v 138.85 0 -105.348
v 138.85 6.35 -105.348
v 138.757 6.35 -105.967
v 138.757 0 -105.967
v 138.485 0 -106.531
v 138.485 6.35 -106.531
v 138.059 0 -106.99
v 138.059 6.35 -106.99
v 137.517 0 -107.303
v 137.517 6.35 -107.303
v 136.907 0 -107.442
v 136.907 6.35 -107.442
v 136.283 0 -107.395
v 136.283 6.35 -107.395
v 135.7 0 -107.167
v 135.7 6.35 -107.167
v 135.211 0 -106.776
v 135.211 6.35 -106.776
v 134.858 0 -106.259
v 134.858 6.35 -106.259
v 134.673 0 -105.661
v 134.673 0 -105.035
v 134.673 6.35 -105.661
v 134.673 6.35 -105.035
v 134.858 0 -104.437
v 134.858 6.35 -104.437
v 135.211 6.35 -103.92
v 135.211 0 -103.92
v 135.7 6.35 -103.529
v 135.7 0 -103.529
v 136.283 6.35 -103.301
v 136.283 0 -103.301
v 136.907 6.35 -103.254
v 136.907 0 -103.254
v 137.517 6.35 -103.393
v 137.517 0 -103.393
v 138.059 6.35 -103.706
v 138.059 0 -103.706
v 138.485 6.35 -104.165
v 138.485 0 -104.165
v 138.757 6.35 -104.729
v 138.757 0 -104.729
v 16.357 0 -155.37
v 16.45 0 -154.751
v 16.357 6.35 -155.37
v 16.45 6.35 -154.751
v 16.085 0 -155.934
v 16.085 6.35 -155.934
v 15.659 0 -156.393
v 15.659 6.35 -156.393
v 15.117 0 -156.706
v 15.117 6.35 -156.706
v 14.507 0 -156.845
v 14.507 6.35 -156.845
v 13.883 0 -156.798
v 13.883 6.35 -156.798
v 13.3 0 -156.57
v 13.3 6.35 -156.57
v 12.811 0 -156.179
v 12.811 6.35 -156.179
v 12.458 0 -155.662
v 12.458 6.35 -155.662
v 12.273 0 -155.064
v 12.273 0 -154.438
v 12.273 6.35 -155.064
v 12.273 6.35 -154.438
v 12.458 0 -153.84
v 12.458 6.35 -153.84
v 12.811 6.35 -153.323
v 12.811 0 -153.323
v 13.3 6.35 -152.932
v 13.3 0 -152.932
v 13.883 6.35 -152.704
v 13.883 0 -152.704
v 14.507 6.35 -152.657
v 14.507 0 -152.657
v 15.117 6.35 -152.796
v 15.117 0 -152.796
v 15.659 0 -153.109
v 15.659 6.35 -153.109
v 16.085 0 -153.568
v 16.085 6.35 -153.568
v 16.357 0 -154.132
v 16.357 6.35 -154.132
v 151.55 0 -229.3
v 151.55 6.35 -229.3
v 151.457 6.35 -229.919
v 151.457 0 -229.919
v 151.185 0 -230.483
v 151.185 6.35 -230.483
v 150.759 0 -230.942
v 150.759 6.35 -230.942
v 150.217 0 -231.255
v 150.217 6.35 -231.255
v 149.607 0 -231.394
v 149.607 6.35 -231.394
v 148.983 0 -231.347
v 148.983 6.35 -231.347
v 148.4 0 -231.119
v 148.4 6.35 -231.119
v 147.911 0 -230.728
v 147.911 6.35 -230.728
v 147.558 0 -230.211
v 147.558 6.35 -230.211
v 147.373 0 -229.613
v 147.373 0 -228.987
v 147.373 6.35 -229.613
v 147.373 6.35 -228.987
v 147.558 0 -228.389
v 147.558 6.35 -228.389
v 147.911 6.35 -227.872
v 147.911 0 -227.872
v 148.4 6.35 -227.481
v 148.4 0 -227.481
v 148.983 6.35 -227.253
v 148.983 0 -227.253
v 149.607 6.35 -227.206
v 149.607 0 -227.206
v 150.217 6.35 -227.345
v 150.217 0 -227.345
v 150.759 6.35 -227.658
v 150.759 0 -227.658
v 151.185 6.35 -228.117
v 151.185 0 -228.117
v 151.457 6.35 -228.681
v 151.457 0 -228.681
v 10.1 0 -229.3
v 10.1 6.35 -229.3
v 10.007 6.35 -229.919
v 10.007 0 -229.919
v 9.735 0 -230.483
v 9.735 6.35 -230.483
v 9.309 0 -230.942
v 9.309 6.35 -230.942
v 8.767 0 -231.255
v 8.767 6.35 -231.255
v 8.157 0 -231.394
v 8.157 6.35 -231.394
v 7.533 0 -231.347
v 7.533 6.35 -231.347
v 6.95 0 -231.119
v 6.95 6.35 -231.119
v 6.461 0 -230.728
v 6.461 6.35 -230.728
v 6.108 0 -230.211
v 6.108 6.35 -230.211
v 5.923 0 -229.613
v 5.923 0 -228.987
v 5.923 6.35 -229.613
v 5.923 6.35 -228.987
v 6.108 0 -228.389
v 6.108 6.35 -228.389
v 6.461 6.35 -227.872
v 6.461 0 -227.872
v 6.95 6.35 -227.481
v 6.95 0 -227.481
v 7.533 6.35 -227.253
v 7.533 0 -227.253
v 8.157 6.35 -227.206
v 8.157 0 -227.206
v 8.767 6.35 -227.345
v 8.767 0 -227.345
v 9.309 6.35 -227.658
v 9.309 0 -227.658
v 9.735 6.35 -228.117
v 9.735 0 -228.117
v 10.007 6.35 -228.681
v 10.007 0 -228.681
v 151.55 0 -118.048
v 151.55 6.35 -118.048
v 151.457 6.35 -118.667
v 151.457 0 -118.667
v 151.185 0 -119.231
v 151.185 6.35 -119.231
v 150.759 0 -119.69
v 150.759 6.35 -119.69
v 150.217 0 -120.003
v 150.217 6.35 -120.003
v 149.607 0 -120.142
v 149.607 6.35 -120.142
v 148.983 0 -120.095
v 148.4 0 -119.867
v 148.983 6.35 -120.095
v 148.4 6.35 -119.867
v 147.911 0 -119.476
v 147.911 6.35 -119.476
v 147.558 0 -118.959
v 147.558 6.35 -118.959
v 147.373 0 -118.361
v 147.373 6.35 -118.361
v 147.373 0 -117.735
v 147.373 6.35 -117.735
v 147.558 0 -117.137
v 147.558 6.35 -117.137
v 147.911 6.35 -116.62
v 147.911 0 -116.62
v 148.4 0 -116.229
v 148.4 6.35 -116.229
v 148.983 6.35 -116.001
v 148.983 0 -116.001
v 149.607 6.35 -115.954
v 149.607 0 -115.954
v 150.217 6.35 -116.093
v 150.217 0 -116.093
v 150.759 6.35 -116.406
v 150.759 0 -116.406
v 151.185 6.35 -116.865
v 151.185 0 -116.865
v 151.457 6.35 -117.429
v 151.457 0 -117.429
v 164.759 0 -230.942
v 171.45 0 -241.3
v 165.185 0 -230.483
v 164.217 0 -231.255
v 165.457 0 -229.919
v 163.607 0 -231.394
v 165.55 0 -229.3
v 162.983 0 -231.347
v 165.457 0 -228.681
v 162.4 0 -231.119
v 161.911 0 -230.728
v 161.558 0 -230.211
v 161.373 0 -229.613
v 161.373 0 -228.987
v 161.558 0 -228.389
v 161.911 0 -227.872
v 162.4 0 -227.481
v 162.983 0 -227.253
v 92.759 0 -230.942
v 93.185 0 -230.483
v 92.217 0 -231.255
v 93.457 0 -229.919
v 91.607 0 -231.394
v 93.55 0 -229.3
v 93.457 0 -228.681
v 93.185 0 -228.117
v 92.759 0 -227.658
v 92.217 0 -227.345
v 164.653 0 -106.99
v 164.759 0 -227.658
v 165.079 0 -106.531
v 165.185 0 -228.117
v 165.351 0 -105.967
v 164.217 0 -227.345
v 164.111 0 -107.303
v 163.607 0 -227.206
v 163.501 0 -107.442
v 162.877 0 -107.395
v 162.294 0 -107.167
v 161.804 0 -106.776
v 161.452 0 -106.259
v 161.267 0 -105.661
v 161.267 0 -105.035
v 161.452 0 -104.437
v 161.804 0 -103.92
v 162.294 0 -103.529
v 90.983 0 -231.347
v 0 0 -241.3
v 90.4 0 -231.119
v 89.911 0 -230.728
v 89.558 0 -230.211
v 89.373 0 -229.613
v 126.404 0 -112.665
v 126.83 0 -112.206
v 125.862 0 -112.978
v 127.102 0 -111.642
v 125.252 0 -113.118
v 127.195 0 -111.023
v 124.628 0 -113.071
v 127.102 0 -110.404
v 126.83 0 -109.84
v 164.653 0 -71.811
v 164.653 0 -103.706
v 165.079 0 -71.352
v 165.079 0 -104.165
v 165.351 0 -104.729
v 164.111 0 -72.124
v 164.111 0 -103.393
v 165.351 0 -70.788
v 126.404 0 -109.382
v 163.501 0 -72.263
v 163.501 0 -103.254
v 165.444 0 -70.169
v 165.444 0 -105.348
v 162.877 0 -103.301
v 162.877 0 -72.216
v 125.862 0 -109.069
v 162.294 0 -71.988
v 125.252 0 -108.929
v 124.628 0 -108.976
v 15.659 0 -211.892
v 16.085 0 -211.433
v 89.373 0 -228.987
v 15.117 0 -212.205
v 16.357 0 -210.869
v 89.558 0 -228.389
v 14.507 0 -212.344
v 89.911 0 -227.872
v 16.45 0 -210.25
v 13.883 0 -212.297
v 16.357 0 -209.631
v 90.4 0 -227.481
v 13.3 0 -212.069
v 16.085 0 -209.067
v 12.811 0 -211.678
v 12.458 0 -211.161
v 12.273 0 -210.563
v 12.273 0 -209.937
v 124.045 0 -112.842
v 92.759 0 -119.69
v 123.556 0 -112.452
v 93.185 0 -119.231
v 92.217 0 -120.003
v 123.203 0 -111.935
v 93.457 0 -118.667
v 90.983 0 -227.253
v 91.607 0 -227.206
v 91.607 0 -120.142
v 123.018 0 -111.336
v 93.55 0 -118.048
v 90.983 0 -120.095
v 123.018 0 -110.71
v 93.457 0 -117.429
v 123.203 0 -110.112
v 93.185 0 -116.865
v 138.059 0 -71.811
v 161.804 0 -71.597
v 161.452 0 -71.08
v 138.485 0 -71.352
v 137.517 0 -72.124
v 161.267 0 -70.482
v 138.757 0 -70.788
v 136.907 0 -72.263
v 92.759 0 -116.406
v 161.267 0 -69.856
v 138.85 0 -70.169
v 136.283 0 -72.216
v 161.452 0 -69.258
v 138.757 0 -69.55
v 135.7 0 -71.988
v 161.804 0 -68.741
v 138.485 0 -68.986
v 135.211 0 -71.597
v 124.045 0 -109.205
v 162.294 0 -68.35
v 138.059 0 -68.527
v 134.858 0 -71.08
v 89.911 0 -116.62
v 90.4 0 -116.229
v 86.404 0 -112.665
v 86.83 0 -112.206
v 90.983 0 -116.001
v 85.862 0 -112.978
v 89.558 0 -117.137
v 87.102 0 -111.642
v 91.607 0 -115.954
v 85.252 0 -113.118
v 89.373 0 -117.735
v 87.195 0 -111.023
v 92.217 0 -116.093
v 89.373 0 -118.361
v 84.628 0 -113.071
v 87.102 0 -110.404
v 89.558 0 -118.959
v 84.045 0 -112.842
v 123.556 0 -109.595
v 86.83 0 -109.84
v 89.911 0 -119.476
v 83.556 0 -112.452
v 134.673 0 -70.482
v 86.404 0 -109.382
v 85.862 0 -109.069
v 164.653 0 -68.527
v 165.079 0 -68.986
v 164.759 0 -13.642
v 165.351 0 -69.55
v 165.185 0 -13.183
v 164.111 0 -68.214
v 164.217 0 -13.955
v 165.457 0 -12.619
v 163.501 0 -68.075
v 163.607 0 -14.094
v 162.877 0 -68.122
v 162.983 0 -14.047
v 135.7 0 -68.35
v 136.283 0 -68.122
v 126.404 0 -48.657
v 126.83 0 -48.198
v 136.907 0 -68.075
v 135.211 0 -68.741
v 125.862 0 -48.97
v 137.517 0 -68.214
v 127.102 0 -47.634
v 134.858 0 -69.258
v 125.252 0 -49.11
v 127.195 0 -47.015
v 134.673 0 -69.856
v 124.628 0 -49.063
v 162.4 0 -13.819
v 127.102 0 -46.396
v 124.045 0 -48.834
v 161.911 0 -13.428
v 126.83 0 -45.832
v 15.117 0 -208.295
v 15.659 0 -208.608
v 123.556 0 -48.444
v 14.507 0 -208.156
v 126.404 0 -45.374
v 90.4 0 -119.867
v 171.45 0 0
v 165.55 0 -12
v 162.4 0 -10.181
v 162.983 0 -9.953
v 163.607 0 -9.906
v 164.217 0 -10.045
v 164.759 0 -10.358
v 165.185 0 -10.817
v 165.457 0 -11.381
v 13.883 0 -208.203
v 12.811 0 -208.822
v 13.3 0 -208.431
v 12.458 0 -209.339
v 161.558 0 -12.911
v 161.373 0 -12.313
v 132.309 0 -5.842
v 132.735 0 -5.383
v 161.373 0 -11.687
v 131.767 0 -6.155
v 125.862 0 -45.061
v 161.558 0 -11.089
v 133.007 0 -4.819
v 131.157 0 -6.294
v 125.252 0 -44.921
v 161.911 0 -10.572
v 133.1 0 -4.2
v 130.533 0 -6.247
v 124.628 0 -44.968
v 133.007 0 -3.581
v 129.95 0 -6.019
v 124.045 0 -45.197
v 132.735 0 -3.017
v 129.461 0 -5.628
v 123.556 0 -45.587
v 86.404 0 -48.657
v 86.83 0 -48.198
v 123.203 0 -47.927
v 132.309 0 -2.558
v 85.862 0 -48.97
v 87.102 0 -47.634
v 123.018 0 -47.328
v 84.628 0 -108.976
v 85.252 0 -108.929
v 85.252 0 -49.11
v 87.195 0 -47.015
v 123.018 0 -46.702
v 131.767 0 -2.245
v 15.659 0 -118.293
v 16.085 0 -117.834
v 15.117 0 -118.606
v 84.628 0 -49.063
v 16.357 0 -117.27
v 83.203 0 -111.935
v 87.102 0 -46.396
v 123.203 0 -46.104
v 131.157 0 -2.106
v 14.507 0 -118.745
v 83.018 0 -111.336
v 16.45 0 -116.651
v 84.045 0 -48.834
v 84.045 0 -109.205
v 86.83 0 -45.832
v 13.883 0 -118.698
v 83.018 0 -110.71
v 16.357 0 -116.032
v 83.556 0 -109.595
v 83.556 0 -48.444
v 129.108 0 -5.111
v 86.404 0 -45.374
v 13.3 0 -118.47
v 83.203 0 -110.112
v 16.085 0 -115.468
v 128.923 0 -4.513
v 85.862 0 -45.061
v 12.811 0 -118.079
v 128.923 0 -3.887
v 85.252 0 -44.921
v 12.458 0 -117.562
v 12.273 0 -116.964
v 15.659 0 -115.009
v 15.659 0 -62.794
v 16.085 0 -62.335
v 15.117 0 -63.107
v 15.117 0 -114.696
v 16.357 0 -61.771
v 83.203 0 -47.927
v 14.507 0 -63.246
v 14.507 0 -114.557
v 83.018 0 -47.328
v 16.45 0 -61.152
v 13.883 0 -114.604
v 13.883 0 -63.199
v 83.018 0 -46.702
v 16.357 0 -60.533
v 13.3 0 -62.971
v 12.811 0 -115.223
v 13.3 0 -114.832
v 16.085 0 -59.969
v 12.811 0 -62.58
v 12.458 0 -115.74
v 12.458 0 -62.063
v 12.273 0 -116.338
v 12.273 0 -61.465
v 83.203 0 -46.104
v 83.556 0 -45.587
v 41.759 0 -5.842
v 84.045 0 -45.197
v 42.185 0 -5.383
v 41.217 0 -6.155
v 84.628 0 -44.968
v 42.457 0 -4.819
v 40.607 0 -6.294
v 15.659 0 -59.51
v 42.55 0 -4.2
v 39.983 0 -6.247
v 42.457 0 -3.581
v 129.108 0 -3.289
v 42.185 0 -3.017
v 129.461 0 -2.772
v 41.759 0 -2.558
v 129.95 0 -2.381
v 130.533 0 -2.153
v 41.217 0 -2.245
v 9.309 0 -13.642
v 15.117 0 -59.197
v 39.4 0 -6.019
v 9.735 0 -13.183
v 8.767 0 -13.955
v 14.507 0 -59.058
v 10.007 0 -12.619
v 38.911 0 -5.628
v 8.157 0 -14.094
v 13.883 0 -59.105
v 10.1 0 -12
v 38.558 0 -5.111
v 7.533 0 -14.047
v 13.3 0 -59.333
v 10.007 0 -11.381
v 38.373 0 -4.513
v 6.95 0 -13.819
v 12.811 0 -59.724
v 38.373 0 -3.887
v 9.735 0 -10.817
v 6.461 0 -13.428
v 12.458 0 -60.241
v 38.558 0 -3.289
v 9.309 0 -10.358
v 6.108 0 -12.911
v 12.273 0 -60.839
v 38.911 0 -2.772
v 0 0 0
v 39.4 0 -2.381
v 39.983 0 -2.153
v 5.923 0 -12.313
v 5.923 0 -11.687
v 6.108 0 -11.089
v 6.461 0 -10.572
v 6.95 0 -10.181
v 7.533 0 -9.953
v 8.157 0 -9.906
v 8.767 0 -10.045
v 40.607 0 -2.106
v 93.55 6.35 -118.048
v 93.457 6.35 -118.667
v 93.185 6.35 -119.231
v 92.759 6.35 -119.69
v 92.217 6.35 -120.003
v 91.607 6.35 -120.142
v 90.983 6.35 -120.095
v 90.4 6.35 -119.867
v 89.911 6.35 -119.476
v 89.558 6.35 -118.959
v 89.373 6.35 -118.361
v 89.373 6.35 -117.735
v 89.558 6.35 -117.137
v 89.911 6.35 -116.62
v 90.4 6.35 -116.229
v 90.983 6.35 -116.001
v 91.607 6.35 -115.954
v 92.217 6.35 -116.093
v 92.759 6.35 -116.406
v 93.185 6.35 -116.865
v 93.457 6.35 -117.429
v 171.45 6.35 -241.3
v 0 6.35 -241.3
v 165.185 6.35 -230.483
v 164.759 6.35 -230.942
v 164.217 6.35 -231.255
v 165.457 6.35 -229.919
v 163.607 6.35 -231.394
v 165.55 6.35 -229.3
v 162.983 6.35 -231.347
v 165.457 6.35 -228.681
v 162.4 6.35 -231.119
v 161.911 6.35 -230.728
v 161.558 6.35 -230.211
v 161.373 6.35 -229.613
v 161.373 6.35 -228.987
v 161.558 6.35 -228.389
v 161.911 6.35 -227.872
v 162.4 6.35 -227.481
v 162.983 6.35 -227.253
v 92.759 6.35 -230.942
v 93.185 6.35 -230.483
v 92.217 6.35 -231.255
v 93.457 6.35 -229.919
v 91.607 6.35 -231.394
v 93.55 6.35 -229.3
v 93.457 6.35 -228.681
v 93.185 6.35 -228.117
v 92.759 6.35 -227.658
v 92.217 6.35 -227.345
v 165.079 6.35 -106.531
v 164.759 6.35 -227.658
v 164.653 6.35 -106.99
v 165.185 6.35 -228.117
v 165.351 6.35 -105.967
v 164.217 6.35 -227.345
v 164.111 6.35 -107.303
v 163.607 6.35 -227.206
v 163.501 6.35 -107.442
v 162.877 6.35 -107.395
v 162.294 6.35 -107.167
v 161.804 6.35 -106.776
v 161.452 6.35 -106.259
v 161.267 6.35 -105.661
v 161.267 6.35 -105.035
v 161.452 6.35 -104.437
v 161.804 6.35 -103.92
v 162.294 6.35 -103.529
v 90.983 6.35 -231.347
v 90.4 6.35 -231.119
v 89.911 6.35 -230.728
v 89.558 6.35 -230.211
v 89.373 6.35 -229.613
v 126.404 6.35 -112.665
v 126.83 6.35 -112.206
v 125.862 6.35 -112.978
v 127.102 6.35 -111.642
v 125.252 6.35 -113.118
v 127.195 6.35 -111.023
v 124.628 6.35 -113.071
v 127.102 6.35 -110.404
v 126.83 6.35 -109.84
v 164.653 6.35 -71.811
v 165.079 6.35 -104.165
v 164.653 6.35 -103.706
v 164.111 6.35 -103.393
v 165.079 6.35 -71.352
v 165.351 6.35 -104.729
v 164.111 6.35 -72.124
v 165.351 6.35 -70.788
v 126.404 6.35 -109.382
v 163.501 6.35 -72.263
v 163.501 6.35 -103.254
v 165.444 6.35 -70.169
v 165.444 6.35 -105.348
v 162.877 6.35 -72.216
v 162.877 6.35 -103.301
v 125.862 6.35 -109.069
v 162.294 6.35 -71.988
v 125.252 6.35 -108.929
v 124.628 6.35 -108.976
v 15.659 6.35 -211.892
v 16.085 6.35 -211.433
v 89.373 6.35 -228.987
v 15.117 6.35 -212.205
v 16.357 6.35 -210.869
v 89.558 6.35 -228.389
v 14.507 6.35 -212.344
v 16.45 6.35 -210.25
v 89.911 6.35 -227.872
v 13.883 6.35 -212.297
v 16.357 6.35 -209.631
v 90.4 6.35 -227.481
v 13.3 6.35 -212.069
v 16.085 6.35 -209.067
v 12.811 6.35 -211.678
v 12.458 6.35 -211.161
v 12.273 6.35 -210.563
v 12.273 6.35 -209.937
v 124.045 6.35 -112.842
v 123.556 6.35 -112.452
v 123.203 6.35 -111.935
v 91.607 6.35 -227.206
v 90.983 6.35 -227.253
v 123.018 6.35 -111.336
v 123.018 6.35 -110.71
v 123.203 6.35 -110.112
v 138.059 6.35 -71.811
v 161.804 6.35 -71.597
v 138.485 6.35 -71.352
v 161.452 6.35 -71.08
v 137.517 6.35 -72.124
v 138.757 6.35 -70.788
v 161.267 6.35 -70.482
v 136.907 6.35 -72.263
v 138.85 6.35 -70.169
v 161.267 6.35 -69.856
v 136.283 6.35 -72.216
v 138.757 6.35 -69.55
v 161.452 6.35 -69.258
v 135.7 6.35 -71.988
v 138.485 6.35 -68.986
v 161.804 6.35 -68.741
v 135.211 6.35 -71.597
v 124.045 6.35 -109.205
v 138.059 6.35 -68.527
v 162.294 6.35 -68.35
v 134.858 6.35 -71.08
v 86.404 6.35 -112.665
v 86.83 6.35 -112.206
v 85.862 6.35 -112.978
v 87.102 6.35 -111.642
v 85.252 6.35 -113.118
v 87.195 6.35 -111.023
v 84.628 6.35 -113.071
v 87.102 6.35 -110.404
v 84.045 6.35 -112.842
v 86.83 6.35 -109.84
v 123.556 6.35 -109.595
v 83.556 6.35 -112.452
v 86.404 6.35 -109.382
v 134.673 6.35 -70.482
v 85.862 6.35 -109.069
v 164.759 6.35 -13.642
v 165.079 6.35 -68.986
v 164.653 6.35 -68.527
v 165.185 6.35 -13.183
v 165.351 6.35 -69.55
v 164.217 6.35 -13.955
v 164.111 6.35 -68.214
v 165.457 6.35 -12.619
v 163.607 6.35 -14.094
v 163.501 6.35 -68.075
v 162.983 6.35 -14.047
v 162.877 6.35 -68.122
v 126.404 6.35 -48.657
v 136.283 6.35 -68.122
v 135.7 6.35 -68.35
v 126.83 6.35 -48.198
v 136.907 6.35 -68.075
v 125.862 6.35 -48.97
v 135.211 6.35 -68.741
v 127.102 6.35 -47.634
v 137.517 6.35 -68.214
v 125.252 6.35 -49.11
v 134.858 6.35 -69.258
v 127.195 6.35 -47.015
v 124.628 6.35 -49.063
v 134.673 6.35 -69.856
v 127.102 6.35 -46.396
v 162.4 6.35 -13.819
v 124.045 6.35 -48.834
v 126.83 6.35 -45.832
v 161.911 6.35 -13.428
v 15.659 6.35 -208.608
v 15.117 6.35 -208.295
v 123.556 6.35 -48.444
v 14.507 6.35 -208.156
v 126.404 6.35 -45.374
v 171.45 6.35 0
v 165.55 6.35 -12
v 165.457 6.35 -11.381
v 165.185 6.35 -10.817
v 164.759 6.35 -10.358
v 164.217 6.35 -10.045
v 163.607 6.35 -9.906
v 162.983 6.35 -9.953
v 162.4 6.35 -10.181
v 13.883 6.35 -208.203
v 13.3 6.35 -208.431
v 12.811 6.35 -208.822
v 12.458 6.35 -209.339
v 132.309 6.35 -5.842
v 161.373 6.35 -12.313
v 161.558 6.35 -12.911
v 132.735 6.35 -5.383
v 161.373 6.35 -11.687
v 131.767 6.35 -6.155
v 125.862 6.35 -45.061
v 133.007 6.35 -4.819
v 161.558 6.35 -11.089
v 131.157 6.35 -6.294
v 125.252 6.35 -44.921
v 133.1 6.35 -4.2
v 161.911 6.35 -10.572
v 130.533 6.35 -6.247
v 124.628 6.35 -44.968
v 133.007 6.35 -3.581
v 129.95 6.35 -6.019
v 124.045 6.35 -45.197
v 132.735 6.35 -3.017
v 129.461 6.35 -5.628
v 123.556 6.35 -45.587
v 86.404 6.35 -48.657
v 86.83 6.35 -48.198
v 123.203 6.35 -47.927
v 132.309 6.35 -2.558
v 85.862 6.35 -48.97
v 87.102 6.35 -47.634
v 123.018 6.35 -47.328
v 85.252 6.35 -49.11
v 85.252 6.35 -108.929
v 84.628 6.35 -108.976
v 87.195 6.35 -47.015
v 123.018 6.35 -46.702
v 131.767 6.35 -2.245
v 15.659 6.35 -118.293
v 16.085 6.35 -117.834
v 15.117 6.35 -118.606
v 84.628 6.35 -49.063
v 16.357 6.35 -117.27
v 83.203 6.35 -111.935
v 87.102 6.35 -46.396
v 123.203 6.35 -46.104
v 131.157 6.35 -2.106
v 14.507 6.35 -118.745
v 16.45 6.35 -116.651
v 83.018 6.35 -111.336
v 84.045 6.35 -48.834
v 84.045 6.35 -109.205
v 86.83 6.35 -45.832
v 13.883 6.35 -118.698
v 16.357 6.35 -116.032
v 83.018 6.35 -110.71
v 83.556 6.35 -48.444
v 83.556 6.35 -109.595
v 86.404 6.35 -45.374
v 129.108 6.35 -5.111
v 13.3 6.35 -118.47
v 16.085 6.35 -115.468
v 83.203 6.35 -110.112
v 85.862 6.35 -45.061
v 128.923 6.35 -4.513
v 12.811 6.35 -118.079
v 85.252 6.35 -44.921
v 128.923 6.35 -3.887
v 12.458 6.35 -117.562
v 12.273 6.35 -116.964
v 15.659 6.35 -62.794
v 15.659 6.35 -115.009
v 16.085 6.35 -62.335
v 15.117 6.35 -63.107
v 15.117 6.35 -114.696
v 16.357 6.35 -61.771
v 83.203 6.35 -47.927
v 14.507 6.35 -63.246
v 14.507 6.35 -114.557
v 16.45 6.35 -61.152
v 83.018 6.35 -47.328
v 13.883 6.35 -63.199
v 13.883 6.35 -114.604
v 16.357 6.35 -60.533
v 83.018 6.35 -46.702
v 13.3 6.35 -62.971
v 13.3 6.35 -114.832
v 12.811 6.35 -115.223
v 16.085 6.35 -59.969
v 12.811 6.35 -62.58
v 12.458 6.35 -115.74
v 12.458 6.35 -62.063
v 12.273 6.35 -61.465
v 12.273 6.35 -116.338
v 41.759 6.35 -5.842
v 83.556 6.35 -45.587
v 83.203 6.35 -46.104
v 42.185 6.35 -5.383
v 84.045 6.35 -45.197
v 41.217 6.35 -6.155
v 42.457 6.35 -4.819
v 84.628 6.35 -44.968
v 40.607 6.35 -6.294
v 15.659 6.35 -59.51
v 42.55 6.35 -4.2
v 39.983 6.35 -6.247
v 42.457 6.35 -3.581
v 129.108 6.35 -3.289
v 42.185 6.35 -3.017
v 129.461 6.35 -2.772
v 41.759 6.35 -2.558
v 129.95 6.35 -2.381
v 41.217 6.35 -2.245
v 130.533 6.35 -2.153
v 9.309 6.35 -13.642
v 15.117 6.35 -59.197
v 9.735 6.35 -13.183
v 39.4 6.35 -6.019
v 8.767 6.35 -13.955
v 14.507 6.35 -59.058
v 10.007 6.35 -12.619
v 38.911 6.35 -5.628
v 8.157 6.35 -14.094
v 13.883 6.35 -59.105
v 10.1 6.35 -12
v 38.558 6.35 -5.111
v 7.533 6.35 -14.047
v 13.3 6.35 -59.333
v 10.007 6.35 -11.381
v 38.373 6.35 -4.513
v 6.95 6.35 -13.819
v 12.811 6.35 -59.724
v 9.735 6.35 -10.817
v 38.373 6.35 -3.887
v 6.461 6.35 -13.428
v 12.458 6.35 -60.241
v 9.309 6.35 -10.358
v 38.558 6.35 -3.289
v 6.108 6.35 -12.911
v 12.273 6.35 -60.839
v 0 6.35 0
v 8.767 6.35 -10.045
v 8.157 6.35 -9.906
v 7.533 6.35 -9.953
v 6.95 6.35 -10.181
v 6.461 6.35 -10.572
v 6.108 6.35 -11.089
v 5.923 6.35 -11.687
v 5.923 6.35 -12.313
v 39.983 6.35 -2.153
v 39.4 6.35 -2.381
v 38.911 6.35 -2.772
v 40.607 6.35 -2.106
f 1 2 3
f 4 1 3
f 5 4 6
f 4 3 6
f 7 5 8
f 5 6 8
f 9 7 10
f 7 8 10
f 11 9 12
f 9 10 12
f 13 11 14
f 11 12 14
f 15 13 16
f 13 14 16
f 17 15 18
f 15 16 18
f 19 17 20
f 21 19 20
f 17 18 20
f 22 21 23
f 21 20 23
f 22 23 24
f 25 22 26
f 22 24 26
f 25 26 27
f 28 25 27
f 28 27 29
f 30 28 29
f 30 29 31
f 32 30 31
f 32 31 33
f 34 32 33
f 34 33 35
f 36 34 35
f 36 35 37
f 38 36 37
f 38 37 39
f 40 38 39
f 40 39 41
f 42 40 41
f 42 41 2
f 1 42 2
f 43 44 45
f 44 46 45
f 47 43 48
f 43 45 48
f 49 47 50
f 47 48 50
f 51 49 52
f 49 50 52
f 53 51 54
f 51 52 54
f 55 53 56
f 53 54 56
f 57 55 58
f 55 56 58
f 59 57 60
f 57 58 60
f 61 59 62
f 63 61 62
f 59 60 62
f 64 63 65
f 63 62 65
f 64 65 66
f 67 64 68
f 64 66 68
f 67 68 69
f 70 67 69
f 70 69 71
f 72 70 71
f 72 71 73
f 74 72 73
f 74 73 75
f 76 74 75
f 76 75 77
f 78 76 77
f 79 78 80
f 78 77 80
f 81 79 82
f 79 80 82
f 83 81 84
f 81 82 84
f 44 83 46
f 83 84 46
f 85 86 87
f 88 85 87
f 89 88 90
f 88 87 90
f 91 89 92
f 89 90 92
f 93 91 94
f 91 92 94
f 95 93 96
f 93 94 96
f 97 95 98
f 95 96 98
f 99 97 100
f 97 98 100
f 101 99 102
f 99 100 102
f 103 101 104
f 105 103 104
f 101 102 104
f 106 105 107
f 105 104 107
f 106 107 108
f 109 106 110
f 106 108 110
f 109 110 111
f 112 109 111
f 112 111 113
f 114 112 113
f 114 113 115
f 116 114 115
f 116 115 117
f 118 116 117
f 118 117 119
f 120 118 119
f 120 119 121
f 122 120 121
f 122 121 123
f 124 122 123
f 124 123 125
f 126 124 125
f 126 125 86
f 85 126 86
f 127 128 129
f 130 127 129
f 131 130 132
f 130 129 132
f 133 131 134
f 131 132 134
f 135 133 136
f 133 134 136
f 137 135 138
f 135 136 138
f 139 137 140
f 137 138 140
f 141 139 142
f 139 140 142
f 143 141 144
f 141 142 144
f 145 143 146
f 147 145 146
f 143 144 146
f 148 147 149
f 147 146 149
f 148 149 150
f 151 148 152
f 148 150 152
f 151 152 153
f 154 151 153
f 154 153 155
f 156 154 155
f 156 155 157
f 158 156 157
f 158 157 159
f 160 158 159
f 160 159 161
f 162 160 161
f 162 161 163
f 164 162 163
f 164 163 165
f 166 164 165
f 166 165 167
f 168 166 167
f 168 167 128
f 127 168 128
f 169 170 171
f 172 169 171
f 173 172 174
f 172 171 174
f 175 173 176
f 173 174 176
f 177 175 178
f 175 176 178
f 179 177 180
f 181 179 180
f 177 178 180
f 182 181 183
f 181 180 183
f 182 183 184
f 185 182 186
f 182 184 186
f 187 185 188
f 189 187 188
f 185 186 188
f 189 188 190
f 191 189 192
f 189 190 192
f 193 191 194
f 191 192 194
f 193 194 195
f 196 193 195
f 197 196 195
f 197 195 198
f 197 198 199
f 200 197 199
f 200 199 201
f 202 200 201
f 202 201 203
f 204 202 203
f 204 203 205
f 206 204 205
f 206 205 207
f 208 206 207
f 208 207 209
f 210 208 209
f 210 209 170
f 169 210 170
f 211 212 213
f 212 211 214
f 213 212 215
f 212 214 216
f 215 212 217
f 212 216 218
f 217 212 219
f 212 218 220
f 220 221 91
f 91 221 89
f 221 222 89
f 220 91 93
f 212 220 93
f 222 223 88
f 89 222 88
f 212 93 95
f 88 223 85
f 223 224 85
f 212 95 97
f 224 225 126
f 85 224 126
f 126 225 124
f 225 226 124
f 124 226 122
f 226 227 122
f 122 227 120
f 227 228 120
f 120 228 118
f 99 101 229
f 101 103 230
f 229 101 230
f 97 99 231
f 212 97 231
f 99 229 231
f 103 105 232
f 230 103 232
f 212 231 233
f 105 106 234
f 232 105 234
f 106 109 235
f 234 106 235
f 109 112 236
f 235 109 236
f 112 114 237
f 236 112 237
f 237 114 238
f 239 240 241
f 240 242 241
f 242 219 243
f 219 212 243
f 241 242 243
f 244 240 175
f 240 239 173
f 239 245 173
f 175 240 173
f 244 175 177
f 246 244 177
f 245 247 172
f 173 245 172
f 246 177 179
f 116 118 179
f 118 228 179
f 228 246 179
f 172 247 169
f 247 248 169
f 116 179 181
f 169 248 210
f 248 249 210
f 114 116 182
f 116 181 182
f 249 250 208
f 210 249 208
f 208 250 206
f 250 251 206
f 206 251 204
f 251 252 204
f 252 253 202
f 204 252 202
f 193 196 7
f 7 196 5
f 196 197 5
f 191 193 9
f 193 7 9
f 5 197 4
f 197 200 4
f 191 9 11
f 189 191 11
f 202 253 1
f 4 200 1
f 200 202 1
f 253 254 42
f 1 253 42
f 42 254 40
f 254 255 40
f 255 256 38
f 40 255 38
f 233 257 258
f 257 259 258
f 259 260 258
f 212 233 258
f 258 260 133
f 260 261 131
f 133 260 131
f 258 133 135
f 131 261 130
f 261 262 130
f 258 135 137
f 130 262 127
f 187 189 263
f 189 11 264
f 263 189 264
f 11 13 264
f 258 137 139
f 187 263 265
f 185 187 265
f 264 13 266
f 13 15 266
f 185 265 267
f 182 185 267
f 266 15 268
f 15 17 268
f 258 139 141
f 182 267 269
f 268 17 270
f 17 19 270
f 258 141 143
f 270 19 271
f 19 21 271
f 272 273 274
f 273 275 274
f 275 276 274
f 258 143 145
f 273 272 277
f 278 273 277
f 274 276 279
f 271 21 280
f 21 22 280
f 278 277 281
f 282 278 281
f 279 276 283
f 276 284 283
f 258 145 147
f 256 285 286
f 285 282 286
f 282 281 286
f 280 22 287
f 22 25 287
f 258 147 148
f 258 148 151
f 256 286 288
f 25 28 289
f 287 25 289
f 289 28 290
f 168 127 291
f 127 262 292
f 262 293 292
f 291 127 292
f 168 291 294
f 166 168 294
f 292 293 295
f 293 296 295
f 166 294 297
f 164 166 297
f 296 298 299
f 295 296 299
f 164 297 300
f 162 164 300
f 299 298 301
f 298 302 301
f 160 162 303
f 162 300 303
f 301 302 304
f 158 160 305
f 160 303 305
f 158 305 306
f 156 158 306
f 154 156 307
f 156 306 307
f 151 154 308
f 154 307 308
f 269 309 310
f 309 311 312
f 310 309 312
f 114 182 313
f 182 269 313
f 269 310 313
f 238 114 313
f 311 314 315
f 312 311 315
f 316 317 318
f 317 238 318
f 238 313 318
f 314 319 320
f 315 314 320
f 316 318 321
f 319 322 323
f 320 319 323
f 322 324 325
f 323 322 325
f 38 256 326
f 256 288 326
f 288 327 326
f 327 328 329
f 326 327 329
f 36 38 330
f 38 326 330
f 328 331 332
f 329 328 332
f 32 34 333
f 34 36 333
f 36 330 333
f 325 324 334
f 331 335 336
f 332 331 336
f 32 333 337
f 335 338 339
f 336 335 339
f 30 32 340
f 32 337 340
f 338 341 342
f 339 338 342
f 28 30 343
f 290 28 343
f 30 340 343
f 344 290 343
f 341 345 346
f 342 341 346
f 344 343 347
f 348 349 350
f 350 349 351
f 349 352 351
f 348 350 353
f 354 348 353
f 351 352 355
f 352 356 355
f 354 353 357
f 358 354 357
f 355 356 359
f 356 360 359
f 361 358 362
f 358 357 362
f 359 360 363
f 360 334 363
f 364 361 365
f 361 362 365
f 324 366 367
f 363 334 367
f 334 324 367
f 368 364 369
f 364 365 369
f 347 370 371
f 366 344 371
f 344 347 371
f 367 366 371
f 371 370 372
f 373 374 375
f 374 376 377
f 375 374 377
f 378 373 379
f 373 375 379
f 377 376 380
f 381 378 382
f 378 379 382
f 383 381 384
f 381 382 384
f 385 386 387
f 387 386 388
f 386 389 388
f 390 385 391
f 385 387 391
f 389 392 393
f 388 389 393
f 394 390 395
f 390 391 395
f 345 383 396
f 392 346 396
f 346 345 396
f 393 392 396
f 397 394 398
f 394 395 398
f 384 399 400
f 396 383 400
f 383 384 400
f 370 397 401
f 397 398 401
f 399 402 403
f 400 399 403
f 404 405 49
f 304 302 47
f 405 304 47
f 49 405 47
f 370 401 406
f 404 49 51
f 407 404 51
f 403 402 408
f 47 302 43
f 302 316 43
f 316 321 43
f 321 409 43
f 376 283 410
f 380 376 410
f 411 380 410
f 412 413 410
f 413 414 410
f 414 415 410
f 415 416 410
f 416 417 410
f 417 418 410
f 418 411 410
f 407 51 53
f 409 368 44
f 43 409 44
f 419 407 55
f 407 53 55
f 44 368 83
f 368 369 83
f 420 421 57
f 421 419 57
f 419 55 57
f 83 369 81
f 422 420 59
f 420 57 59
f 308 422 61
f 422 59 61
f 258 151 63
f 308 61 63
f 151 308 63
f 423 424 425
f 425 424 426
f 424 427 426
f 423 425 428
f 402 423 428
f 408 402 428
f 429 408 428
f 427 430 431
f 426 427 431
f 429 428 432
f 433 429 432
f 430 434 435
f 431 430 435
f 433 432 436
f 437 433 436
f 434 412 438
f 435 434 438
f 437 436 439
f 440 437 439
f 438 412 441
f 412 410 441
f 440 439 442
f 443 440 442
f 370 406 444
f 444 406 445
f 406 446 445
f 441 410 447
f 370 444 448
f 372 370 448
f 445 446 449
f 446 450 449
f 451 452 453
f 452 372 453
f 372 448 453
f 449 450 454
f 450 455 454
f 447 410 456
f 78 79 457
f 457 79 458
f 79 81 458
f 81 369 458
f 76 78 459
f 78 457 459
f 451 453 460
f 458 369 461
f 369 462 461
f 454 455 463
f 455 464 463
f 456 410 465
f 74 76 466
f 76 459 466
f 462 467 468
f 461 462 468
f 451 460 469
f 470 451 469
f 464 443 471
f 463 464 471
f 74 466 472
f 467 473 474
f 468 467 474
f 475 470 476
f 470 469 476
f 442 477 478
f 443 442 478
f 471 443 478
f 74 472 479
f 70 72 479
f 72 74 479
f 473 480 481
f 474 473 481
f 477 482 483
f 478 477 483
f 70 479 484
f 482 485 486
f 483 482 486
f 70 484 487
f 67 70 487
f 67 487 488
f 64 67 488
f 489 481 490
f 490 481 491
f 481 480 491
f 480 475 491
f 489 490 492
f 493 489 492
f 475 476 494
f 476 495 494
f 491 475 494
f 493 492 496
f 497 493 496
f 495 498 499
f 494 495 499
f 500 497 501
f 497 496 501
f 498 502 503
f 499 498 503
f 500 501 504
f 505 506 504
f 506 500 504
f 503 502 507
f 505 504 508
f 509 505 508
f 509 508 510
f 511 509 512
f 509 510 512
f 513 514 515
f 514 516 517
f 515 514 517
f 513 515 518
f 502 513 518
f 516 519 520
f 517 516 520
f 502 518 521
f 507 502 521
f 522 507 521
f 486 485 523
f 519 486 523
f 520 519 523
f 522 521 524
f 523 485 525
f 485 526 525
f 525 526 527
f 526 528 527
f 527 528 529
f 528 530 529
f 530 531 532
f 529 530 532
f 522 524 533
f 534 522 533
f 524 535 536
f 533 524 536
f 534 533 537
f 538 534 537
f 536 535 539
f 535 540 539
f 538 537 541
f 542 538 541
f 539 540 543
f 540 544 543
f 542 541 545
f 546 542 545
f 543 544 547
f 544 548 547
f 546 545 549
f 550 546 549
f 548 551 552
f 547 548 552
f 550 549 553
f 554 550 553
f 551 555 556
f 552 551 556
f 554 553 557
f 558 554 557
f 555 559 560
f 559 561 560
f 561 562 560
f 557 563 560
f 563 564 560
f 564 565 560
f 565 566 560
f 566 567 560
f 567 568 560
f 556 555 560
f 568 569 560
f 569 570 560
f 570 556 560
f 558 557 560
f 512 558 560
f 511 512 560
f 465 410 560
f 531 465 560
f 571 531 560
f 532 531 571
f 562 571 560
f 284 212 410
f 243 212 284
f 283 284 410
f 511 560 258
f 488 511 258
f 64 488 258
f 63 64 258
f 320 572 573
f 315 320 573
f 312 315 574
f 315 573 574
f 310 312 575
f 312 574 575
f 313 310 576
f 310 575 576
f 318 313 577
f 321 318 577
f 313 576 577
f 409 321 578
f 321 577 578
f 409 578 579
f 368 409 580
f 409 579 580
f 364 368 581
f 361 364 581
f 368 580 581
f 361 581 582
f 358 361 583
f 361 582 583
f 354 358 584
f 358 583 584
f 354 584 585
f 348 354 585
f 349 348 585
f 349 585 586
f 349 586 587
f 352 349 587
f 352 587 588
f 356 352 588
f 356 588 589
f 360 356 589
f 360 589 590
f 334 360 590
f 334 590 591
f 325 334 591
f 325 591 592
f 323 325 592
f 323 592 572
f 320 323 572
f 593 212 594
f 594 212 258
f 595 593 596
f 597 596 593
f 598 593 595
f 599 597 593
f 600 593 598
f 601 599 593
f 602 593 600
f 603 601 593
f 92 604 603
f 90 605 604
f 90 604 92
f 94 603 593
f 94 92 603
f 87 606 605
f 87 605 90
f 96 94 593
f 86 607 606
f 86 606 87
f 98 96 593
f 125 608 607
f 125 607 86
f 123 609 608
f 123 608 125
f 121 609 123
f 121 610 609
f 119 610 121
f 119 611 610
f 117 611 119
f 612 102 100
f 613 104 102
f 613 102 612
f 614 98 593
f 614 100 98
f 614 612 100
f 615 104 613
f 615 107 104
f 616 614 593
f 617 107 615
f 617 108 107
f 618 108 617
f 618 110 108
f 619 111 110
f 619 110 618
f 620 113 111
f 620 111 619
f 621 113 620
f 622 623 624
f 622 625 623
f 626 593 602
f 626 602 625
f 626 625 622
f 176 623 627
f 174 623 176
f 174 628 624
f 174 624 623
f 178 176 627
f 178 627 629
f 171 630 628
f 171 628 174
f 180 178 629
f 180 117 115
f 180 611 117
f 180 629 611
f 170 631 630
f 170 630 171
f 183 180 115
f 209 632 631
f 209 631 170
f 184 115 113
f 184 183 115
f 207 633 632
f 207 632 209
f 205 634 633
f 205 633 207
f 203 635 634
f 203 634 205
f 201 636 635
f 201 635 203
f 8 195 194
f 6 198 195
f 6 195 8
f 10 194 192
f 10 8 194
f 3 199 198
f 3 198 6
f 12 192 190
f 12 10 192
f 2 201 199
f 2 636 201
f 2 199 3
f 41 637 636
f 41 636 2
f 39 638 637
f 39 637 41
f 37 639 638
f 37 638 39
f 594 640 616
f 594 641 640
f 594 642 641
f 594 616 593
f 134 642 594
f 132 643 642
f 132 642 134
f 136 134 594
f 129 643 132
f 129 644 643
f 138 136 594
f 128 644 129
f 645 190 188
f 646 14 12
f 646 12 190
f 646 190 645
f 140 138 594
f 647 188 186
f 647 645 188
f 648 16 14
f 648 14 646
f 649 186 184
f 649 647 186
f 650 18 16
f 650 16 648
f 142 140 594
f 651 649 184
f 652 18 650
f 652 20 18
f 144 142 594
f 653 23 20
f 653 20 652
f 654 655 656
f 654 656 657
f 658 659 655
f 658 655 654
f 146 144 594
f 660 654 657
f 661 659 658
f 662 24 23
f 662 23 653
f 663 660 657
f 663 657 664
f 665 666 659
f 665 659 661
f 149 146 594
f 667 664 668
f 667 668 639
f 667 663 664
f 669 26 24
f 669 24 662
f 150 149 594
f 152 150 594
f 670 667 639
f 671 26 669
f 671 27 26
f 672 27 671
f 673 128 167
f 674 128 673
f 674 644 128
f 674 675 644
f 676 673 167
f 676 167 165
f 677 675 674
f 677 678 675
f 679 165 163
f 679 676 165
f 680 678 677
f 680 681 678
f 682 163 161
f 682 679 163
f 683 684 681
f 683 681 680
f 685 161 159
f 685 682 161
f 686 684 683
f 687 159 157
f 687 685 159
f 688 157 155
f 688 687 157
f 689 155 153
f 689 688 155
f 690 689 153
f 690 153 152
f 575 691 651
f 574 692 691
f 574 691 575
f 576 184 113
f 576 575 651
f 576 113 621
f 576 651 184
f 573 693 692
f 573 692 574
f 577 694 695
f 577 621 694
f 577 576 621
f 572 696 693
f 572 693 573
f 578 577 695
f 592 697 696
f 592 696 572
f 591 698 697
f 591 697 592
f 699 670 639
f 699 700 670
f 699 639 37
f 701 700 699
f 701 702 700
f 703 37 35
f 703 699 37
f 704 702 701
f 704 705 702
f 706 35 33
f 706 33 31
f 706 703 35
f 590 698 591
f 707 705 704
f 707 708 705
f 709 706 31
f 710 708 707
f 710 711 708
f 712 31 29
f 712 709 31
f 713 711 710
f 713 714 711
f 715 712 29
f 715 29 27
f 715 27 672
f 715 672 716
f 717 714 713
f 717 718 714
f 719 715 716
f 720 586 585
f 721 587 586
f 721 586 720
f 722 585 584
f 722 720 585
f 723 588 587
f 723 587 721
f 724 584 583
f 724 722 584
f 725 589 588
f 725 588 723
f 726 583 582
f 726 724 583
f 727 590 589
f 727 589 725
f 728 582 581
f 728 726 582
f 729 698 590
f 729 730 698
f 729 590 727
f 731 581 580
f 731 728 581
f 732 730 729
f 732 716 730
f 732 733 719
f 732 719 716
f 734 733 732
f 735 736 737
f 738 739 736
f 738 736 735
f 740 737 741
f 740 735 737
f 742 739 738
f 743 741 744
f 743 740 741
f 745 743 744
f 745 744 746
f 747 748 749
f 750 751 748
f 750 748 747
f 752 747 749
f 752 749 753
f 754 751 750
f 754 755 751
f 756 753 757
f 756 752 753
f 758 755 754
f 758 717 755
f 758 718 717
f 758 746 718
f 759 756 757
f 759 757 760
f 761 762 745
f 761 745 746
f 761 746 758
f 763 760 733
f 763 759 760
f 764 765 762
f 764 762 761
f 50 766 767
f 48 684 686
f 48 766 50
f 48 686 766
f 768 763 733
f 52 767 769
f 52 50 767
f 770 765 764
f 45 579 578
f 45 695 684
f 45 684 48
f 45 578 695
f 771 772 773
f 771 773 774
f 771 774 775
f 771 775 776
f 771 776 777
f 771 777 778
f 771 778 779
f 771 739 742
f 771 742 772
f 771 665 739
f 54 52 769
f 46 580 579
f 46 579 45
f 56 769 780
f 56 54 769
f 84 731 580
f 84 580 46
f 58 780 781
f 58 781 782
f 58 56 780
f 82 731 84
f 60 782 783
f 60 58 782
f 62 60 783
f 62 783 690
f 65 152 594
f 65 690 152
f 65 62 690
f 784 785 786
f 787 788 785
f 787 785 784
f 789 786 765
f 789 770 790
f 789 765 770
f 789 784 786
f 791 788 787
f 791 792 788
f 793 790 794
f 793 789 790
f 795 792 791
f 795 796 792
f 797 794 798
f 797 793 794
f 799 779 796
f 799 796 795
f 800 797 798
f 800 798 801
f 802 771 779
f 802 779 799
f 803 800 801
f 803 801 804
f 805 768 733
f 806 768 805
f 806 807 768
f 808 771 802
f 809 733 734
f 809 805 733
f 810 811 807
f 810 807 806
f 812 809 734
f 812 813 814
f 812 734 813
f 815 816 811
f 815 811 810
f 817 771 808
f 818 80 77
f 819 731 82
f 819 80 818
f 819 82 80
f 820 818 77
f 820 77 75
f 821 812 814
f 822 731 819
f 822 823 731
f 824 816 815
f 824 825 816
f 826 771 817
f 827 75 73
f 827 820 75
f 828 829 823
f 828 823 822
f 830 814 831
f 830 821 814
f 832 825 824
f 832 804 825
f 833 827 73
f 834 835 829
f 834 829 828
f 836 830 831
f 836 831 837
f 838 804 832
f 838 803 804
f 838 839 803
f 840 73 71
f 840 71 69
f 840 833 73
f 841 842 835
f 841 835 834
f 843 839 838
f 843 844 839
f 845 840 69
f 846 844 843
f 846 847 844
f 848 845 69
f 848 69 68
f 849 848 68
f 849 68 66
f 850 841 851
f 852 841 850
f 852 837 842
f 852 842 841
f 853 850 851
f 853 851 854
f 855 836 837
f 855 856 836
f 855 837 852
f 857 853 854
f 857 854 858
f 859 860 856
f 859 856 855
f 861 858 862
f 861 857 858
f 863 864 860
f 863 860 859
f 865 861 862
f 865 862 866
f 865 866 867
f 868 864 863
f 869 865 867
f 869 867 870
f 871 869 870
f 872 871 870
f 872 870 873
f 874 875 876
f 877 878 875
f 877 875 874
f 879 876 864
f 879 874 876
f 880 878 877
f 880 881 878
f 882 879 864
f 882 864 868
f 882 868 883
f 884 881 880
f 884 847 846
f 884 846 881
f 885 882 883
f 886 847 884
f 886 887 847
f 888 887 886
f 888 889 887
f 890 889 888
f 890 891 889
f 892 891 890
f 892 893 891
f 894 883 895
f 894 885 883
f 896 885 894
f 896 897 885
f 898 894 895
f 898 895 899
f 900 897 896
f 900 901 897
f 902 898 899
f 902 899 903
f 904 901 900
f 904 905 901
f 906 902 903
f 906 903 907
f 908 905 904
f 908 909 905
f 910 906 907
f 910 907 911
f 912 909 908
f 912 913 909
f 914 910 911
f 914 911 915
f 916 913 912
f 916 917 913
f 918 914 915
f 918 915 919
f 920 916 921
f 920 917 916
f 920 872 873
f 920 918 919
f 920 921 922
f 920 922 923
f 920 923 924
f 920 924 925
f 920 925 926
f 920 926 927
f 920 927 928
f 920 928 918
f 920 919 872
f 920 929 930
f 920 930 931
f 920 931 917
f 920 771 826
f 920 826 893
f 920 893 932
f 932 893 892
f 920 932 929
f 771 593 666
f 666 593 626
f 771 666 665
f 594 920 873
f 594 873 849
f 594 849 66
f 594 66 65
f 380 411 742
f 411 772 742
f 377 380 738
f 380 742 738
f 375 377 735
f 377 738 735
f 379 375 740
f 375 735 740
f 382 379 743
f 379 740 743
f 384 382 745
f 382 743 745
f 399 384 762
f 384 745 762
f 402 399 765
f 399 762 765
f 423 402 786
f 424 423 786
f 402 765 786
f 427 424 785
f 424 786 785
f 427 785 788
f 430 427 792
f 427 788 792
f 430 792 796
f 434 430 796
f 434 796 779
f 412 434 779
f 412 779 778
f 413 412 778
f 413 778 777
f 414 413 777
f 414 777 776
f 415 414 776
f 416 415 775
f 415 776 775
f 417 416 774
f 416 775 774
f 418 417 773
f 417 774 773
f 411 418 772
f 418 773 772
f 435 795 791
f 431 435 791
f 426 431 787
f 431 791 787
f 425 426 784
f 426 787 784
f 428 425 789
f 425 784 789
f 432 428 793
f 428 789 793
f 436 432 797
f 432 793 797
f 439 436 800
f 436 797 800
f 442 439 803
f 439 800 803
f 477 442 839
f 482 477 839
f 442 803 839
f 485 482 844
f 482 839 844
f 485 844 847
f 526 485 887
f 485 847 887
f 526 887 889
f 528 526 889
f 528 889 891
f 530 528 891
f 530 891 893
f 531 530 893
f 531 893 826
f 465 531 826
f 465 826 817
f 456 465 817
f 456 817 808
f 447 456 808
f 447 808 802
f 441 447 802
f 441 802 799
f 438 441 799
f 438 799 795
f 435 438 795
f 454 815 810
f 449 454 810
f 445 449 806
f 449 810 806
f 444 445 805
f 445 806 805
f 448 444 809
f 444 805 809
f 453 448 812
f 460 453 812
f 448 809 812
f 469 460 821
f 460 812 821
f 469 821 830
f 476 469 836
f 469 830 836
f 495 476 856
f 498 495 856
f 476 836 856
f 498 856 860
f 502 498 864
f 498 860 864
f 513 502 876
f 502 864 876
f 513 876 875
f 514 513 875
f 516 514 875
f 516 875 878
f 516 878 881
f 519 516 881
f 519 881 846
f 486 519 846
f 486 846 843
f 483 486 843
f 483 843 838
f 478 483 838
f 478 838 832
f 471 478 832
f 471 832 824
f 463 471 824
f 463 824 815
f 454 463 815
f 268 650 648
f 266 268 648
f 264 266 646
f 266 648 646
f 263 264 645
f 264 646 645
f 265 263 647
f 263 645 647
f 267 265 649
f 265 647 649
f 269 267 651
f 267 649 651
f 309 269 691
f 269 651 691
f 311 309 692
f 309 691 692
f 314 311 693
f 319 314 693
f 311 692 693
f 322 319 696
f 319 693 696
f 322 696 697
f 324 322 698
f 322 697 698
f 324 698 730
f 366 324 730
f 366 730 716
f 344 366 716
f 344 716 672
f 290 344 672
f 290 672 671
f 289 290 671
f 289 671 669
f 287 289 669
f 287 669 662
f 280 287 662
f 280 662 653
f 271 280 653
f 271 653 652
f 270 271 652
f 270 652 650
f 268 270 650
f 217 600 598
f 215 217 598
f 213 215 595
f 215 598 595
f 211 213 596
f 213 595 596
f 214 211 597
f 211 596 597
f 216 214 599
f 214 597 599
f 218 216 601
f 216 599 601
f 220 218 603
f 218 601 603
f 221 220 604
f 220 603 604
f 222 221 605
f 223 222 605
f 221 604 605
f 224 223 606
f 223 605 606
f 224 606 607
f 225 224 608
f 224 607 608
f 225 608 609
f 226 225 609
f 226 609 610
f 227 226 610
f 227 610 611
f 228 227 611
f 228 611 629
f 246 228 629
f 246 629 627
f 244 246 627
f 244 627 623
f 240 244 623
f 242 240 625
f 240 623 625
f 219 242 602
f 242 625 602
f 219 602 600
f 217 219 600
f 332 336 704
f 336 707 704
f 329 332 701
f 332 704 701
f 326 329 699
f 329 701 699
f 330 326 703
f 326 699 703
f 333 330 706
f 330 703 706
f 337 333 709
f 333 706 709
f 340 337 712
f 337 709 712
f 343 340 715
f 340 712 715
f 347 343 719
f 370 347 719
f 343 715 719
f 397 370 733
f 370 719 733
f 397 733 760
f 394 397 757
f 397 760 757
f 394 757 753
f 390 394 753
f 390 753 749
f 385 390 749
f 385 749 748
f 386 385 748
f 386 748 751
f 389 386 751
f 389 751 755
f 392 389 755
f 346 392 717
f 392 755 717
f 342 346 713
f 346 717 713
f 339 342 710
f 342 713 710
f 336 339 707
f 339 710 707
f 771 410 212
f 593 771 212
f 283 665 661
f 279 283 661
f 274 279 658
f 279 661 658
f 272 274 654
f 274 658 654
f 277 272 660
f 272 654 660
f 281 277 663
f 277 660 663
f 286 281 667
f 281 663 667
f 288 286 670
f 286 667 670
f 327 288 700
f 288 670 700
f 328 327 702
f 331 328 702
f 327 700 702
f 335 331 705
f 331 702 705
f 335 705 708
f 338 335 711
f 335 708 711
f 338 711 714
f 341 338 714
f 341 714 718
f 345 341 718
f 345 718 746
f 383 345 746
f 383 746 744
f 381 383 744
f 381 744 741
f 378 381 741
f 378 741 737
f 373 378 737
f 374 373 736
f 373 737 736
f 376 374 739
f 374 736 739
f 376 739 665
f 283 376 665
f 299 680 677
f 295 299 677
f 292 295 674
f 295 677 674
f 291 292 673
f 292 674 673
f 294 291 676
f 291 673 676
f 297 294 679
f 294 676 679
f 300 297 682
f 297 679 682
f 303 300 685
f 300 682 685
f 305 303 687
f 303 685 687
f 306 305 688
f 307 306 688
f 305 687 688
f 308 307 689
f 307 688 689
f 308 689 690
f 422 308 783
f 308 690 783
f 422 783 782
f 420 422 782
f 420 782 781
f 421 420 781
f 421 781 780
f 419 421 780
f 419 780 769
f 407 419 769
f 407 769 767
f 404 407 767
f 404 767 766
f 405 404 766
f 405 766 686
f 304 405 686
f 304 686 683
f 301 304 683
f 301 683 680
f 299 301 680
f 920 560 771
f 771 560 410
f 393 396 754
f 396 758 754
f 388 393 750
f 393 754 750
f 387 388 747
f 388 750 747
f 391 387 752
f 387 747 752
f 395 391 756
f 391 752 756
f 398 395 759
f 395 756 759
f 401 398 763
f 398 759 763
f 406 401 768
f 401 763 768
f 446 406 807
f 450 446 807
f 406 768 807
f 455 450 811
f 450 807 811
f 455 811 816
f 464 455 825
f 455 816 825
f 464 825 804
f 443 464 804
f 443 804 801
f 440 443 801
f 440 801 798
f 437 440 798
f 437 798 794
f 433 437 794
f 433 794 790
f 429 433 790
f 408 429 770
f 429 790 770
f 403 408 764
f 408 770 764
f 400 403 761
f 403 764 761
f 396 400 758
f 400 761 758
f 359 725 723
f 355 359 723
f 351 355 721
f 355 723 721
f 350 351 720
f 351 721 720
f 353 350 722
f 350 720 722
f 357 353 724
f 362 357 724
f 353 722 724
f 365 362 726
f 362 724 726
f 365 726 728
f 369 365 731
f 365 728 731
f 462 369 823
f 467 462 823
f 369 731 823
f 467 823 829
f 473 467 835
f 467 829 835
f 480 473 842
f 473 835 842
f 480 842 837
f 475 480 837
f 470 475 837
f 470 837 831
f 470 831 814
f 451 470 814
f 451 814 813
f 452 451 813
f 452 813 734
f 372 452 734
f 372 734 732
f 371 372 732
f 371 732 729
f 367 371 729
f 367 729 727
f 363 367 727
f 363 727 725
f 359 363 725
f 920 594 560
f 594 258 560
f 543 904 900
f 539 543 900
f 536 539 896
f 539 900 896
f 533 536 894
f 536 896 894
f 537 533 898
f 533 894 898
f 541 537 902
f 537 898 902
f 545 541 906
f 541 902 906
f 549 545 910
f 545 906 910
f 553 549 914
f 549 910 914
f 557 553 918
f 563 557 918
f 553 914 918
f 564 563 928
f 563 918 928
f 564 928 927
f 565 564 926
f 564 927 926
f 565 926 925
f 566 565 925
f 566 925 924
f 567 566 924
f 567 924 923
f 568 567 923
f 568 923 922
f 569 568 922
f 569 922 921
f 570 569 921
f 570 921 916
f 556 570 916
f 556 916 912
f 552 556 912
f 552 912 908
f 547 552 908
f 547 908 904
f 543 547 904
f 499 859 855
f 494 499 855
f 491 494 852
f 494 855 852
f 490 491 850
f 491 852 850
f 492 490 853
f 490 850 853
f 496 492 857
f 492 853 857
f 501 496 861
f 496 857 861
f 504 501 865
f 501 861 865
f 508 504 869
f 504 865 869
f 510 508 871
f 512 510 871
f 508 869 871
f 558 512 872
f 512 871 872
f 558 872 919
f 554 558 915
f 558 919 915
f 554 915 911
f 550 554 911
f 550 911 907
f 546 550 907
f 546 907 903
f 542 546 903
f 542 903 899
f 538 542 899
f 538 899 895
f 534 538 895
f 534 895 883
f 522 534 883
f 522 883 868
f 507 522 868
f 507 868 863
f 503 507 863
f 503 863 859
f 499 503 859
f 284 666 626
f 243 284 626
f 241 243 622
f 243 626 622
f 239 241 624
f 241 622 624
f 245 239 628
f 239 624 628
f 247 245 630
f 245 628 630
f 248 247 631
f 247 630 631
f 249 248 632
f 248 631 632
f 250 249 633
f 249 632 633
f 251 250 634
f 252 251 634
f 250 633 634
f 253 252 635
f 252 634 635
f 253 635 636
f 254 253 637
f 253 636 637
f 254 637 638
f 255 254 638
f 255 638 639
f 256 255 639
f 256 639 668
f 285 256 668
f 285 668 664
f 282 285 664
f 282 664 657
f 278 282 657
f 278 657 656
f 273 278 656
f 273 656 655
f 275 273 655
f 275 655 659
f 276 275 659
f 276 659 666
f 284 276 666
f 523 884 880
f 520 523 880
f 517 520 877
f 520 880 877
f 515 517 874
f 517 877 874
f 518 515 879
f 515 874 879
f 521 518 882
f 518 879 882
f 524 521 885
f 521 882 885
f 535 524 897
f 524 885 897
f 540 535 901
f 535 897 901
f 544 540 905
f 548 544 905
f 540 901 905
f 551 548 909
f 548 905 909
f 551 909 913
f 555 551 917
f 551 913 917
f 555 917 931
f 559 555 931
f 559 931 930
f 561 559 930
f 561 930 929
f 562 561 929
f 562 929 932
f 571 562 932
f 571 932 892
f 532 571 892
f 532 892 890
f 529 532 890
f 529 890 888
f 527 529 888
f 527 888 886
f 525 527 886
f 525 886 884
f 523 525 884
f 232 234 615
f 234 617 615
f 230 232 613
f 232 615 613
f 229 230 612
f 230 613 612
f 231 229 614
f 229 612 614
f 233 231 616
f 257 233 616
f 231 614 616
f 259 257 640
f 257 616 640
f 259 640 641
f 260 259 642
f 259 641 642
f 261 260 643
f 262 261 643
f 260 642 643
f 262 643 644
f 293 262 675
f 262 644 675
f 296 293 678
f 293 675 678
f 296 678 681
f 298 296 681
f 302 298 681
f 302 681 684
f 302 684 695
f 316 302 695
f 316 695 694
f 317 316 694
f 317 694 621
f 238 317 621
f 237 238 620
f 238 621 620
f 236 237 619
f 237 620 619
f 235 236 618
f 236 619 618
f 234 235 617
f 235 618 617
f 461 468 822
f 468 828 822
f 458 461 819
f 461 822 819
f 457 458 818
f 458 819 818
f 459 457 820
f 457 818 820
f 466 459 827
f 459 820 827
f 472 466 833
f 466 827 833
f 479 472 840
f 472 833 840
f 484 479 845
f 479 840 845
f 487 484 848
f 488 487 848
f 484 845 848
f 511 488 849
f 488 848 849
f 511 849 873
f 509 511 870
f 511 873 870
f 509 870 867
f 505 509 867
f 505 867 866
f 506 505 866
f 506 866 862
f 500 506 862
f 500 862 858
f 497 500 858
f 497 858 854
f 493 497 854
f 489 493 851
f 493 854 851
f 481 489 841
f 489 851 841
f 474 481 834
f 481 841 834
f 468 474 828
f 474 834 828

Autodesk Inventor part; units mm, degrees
ref_plane "YZ Plane" through (0, 0, 0) normal (1, 0, 0) x (0, 1, 0)
ref_plane "XZ Plane" through (0, 0, 0) normal (0, 1, 0) x (-1, 0, 0)
ref_plane "XY Plane" through (0, 0, 0) normal (0, 0, 1) x (1, 0, 0)
sketch "Sketch1" plane through (0, 0, 0) normal (0, 1, 0) x (-1, 0, 0)
  line L0 (0, 0) -> (-171.45, 0)
  line L1 (-171.45, 0) -> (-171.45, -241.3)
  line L2 (-171.45, -241.3) -> (0, -241.3)
  line L3 (0, -241.3) -> (0, 0)
  dimension "d0" = 171.45
  dimension "d1" = 241.3
extrude "Extrusion1" add sketch "Sketch1" along normal blind 6.35
sketch "Sketch2" plane through (0, 6.35, 0) normal (0, 1, 0) x (1, 0, 0)
  line L0 (0, 0) -> (8, 0)
  line L1 (0, 0) -> (171.45, 0) projected
  line L2 (8, 0) -> (8, 12)
  line L3 (171.45, 0) -> (163.45, 0)
  line L4 (163.45, 0) -> (163.45, 12)
  line L5 (171.45, 241.3) -> (0, 241.3) projected
  line L6 (0, 241.3) -> (8, 241.3)
  line L7 (8, 241.3) -> (8, 229.3)
  line L8 (171.45, 241.3) -> (163.45, 241.3)
  line L9 (163.45, 241.3) -> (163.45, 229.3)
  circle A0 centre (8, 229.3) radius 2.1
  circle A1 centre (163.45, 229.3) radius 2.1
  circle A2 centre (163.45, 12) radius 2.1
  circle A3 centre (8, 12) radius 2.1
  dimension "d4" = 8
  dimension "d5" = 12
  dimension "d6" = 8
  dimension "d7" = 12
  dimension "d8" = 8
  dimension "d9" = 12
  dimension "d10" = 8
  dimension "d11" = 12
  dimension "d12" = 4.2
  dimension "d13" = 4.2
  dimension "d14" = 4.2
  dimension "d15" = 4.2
extrude "Extrusion2" cut sketch "Sketch2" against normal blind 25.4
sketch "Sketch3" plane through (0, 6.35, 0) normal (0, 1, 0) x (1, 0, 0)
  circle A0 centre (163.45, 12) radius 2.1 projected
  circle A1 centre (8, 229.3) radius 2.1 projected
  circle A2 centre (163.45, 229.3) radius 2.1 projected
  circle A3 centre (8, 12) radius 2.1 projected
  line L0 (0, 0) -> (171.45, 0) projected
  line L1 (171.45, 0) -> (171.45, 241.3) projected
  line L2 (171.45, 241.3) -> (0, 241.3) projected
  line L3 (0, 241.3) -> (0, 0) projected
  line L4 (163.45, 229.3) -> (149.45, 229.3)
  line L5 (149.45, 229.3) -> (91.45, 229.3)
  circle A4 centre (149.45, 229.3) radius 2.1
  circle A5 centre (91.45, 229.3) radius 2.1
  circle A6 centre (149.45, 118.048) radius 2.1
  circle A7 centre (91.45, 118.048) radius 2.1
  line L6 (171.45, 0) -> (125.095, 0)
  line L7 (0, 0) -> (171.45, 0) projected
  line L8 (125.095, 0) -> (125.095, 47.0154)
  circle A8 centre (125.095, 47.0154) radius 2.1
  line L9 (125.095, 47.0154) -> (85.095, 47.0154)
  circle A9 centre (85.095, 47.0154) radius 2.1
  line L10 (125.095, 47.0154) -> (125.095, 111.0234)
  line L11 (125.095, 111.0234) -> (85.095, 111.0234)
  circle A10 centre (85.095, 111.0234) radius 2.1
  circle A11 centre (125.095, 111.0234) radius 2.1
  line L12 (8, 229.3) -> (14.35, 229.3)
  line L13 (14.35, 229.3) -> (14.35, 210.25)
  circle A12 centre (14.35, 210.25) radius 2.1
  line L14 (14.35, 210.25) -> (14.35, 154.751)
  circle A13 centre (14.35, 154.751) radius 2.1
  line L15 (14.35, 154.751) -> (14.35, 116.651)
  circle A14 centre (14.35, 116.651) radius 2.1
  line L16 (14.35, 116.651) -> (14.35, 61.152)
  circle A15 centre (14.35, 61.152) radius 2.1
  dimension "d22" = 14
  dimension "d23" = 58
  dimension "d24" = 4.2
  dimension "d25" = 4.2
  dimension "d28" = 4.2
  dimension "d29" = 111.252
  dimension "d30" = 0
  dimension "d31" = 4.2
  dimension "d32" = 58
  dimension "d33" = 111.252
  dimension "d39" = 46.355
  dimension "d40" = 47.0154
  dimension "d41" = 4.2
  dimension "d42" = 40
  dimension "d43" = 4.2
  dimension "d44" = 64.008
  dimension "d45" = 4.2
  dimension "d46" = 4.2
  dimension "d51" = 6.35
  dimension "d52" = 4.2
  dimension "d53" = 19.05
  dimension "d54" = 55.499
  dimension "d55" = 4.2
  dimension "d56" = 38.1
  dimension "d57" = 4.2
  dimension "d58" = 55.499
  dimension "d59" = 4.2
extrude "Extrusion3" cut sketch "Sketch3" against normal blind 25.4 contours A15 | A14 L16 L15 | L15 L16 A14 | A13 L15 L14 | L14 L15 A13 | A12 L14 L13 | L13 L14 A12 | A5 | A4 L5 L4 | L4 L5 A4 | A9 | A10 | A11 L11 L10 | L10 L11 A11 | A8 L9 L8 | L8 L10 A8 | L9 A8 L10 | A6 | A7
sketch "Sketch4" plane through (0, 6.35, 0) normal (0, 1, 0) x (1, 0, 0)
  line L0 (0, 0) -> (171.45, 0) projected
  line L1 (171.45, 0) -> (131, 0)
  line L2 (131, 0) -> (131, 4.2)
  circle A0 centre (131, 4.2) radius 2.1
  line L3 (0, 0) -> (40.45, 0)
  line L4 (0, 0) -> (171.45, 0) projected
  line L5 (40.45, 0) -> (40.45, 4.2)
  circle A1 centre (40.45, 4.2) radius 2.1
  dimension "d60" = 40.45
  dimension "d61" = 4.2
  dimension "d65" = 4.2
  dimension "d66" = 40.45
  dimension "d67" = 4.2
  dimension "d68" = 4.2
extrude "Extrusion4" cut sketch "Sketch4" against normal blind 25.4
sketch "Sketch5" plane through (0, 6.35, 0) normal (0, 1, 0) x (1, 0, 0)
  circle A0 centre (149.45, 118.048) radius 2.1 projected
  circle A1 centre (131, 4.2) radius 2.1 projected
  circle A2 centre (40.45, 4.2) radius 2.1 projected
  circle A3 centre (14.35, 116.651) radius 2.1 projected
  circle A4 centre (14.35, 210.25) radius 2.1 projected
  circle A5 centre (85.095, 111.0234) radius 2.1 projected
  circle A6 centre (125.095, 47.0154) radius 2.1 projected
  circle A7 centre (149.45, 118.048) radius 2.1 projected
  circle A8 centre (149.45, 229.3) radius 2.1 projected
  circle A9 centre (91.45, 229.3) radius 2.1 projected
  circle A10 centre (91.45, 118.048) radius 2.1 projected
  circle A11 centre (85.095, 47.0154) radius 2.1 projected
  circle A12 centre (125.095, 111.0234) radius 2.1 projected
  circle A13 centre (14.35, 154.751) radius 2.1 projected
  circle A14 centre (14.35, 61.152) radius 2.1 projected
  circle A15 centre (163.45, 12) radius 2.1 projected
  circle A16 centre (8, 229.3) radius 2.1 projected
  circle A17 centre (163.45, 229.3) radius 2.1 projected
  circle A18 centre (8, 12) radius 2.1 projected
  line L0 (0, 0) -> (171.45, 0) projected
  line L1 (171.45, 0) -> (171.45, 241.3) projected
  line L2 (171.45, 241.3) -> (0, 241.3) projected
  line L3 (0, 241.3) -> (0, 0) projected
  line L4 (149.45, 118.048) -> (149.45, 105.348)
  line L5 (149.45, 105.348) -> (136.75, 105.348)
  circle A19 centre (136.75, 105.348) radius 2.1
  line L6 (136.75, 105.348) -> (163.3438, 105.348)
  circle A20 centre (163.3438, 105.348) radius 2.1
  line L7 (136.75, 105.348) -> (136.75, 70.169)
  circle A21 centre (136.75, 70.169) radius 2.1
  line L8 (163.3438, 105.348) -> (163.3438, 70.169)
  circle A22 centre (163.3438, 70.169) radius 2.1
  dimension "d69" = 12.7
  dimension "d70" = 12.7
  dimension "d71" = 4.2
  dimension "d72" = 26.5938
  dimension "d73" = 4.2
  dimension "d74" = 35.179
  dimension "d75" = 4.2
  dimension "d76" = 35.179
  dimension "d77" = 4.2
extrude "Extrusion5" cut sketch "Sketch5" against normal blind 25.4 contours A22 | A20 L8 L6 | L6 L8 A20 | A21 | A19 L7 L5 | L5 L7 A19
properties part number "ModBoard-Bottom"
